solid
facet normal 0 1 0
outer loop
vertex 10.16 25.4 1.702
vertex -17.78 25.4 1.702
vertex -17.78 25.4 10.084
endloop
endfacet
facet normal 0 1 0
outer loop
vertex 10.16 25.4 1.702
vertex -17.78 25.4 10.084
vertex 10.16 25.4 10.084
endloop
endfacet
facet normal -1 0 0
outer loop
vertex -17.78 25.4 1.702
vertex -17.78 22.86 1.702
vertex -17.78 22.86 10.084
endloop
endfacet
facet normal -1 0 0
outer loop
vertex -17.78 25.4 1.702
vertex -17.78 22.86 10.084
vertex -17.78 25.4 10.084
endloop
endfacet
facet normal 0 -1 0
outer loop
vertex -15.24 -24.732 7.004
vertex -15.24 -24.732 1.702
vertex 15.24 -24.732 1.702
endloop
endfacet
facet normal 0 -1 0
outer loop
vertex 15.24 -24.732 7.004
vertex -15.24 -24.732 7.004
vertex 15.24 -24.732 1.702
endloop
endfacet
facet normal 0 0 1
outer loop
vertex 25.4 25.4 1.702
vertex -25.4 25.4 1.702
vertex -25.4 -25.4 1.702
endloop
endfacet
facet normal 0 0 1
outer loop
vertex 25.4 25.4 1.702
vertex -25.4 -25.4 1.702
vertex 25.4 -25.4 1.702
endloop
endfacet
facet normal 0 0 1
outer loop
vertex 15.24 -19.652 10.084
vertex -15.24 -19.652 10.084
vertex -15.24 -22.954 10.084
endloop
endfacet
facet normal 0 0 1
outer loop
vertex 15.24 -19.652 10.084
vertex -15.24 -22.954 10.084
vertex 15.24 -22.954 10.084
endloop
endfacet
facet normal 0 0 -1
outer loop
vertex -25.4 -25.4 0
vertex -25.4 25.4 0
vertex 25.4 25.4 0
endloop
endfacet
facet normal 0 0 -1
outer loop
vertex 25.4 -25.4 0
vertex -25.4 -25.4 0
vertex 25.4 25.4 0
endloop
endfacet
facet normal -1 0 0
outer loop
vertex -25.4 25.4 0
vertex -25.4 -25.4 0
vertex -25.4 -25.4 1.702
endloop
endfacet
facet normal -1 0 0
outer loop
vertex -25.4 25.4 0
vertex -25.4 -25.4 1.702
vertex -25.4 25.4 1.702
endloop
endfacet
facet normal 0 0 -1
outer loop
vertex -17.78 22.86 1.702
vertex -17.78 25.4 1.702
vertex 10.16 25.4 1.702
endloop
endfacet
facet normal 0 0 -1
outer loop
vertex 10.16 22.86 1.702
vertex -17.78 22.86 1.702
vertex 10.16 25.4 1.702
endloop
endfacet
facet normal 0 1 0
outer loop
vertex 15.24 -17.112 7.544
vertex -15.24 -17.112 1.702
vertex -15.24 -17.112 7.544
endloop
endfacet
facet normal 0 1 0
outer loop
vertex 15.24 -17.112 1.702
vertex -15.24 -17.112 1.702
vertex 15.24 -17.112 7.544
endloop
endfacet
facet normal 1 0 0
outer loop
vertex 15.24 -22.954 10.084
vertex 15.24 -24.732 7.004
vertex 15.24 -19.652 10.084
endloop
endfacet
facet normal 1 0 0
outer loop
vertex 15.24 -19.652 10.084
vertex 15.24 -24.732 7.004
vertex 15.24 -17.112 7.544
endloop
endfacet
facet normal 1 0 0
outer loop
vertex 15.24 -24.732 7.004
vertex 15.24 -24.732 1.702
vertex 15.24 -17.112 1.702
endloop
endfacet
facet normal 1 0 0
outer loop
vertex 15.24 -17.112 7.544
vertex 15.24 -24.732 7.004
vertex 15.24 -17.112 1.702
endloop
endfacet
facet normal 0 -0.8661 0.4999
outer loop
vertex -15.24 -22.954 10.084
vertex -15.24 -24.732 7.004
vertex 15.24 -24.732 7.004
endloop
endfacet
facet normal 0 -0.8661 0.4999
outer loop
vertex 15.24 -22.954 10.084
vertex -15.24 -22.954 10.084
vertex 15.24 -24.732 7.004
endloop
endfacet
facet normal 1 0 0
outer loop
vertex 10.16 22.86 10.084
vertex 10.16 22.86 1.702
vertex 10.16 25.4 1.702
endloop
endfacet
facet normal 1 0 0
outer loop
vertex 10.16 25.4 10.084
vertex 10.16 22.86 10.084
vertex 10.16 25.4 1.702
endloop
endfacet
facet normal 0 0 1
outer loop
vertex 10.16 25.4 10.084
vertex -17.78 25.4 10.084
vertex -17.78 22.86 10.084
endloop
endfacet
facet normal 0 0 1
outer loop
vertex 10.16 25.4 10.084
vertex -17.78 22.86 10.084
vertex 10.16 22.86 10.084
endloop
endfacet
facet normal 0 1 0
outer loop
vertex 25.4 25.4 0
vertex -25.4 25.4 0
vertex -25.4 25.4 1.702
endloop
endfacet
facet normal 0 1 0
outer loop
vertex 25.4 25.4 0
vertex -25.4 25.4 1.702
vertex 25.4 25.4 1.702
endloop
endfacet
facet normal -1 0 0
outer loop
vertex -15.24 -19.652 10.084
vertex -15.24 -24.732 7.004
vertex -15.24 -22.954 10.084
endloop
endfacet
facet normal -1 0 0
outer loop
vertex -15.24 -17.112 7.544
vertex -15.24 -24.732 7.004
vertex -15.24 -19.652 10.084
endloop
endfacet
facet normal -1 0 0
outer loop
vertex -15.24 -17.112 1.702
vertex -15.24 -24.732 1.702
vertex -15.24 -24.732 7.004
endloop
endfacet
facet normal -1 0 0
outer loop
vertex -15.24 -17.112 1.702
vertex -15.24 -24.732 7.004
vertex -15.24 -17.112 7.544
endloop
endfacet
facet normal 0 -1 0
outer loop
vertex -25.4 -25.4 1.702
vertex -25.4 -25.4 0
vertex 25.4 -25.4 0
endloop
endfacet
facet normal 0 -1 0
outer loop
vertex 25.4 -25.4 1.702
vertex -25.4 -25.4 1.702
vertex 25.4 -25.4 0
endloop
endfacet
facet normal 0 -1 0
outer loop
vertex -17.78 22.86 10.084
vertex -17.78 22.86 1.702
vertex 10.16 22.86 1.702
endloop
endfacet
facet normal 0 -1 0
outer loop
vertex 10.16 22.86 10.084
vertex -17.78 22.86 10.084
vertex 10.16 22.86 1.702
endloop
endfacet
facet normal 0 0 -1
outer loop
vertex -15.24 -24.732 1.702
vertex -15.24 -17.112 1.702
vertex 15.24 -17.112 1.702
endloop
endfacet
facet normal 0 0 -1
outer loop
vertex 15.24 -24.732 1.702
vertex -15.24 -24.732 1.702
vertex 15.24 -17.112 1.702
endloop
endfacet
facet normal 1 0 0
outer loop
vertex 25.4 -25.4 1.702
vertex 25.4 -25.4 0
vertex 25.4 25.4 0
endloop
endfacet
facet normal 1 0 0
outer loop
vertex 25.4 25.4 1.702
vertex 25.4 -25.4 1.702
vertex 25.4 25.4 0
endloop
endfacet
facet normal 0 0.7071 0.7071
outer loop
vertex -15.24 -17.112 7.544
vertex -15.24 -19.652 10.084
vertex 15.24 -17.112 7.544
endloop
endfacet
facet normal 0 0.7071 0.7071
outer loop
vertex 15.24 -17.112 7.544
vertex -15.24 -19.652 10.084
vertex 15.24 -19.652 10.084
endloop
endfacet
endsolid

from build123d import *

# Parameters (mm, degrees)
F0_W     = 50.8
F0_H     = 50.8
F1_DEPTH = 1.7018
F2_W     = 30.48
F2_H     = 7.62
F3_DEPTH = 8.382
F4_W     = 27.94
F4_H     = 2.54
F5_DEPTH = 8.382
F6_SIZE  = 2.54
F7_SIZE2 = 3.079586
F7_SIZE  = 1.778


with BuildPart() as f1:
    # F0 (on Top) → F1 (new body)
    with BuildSketch(Plane.XY):
        Rectangle(F0_W, F0_H)
    extrude(amount=F1_DEPTH)


with BuildPart() as f3:
    # F2 (on face) → F3 (new body)
    with BuildSketch(Plane.XY.offset(1.7018)):
        with Locations((0, -20.922448)):
            Rectangle(F2_W, F2_H)
    extrude(amount=F3_DEPTH)

    # F6
    f6_edges = [f3.edges().sort_by_distance(p)[0] for p in [
        (0, -17.112448, 10.0838),
    ]]
    chamfer(f6_edges, length=F6_SIZE)

    # F7
    f7_edges = [f3.edges().sort_by_distance(p)[0] for p in [
        (0, -24.732448, 10.0838),
    ]]
    chamfer(f7_edges, length=F7_SIZE, length2=F7_SIZE2)


with BuildPart() as f5:
    # F4 (on face) → F5 (new body)
    with BuildSketch(Plane.XY.offset(1.7018)):
        with Locations((-3.81, 24.13)):
            Rectangle(F4_W, F4_H)
    extrude(amount=F5_DEPTH)


solid = Compound([f1.part, f3.part, f5.part])
